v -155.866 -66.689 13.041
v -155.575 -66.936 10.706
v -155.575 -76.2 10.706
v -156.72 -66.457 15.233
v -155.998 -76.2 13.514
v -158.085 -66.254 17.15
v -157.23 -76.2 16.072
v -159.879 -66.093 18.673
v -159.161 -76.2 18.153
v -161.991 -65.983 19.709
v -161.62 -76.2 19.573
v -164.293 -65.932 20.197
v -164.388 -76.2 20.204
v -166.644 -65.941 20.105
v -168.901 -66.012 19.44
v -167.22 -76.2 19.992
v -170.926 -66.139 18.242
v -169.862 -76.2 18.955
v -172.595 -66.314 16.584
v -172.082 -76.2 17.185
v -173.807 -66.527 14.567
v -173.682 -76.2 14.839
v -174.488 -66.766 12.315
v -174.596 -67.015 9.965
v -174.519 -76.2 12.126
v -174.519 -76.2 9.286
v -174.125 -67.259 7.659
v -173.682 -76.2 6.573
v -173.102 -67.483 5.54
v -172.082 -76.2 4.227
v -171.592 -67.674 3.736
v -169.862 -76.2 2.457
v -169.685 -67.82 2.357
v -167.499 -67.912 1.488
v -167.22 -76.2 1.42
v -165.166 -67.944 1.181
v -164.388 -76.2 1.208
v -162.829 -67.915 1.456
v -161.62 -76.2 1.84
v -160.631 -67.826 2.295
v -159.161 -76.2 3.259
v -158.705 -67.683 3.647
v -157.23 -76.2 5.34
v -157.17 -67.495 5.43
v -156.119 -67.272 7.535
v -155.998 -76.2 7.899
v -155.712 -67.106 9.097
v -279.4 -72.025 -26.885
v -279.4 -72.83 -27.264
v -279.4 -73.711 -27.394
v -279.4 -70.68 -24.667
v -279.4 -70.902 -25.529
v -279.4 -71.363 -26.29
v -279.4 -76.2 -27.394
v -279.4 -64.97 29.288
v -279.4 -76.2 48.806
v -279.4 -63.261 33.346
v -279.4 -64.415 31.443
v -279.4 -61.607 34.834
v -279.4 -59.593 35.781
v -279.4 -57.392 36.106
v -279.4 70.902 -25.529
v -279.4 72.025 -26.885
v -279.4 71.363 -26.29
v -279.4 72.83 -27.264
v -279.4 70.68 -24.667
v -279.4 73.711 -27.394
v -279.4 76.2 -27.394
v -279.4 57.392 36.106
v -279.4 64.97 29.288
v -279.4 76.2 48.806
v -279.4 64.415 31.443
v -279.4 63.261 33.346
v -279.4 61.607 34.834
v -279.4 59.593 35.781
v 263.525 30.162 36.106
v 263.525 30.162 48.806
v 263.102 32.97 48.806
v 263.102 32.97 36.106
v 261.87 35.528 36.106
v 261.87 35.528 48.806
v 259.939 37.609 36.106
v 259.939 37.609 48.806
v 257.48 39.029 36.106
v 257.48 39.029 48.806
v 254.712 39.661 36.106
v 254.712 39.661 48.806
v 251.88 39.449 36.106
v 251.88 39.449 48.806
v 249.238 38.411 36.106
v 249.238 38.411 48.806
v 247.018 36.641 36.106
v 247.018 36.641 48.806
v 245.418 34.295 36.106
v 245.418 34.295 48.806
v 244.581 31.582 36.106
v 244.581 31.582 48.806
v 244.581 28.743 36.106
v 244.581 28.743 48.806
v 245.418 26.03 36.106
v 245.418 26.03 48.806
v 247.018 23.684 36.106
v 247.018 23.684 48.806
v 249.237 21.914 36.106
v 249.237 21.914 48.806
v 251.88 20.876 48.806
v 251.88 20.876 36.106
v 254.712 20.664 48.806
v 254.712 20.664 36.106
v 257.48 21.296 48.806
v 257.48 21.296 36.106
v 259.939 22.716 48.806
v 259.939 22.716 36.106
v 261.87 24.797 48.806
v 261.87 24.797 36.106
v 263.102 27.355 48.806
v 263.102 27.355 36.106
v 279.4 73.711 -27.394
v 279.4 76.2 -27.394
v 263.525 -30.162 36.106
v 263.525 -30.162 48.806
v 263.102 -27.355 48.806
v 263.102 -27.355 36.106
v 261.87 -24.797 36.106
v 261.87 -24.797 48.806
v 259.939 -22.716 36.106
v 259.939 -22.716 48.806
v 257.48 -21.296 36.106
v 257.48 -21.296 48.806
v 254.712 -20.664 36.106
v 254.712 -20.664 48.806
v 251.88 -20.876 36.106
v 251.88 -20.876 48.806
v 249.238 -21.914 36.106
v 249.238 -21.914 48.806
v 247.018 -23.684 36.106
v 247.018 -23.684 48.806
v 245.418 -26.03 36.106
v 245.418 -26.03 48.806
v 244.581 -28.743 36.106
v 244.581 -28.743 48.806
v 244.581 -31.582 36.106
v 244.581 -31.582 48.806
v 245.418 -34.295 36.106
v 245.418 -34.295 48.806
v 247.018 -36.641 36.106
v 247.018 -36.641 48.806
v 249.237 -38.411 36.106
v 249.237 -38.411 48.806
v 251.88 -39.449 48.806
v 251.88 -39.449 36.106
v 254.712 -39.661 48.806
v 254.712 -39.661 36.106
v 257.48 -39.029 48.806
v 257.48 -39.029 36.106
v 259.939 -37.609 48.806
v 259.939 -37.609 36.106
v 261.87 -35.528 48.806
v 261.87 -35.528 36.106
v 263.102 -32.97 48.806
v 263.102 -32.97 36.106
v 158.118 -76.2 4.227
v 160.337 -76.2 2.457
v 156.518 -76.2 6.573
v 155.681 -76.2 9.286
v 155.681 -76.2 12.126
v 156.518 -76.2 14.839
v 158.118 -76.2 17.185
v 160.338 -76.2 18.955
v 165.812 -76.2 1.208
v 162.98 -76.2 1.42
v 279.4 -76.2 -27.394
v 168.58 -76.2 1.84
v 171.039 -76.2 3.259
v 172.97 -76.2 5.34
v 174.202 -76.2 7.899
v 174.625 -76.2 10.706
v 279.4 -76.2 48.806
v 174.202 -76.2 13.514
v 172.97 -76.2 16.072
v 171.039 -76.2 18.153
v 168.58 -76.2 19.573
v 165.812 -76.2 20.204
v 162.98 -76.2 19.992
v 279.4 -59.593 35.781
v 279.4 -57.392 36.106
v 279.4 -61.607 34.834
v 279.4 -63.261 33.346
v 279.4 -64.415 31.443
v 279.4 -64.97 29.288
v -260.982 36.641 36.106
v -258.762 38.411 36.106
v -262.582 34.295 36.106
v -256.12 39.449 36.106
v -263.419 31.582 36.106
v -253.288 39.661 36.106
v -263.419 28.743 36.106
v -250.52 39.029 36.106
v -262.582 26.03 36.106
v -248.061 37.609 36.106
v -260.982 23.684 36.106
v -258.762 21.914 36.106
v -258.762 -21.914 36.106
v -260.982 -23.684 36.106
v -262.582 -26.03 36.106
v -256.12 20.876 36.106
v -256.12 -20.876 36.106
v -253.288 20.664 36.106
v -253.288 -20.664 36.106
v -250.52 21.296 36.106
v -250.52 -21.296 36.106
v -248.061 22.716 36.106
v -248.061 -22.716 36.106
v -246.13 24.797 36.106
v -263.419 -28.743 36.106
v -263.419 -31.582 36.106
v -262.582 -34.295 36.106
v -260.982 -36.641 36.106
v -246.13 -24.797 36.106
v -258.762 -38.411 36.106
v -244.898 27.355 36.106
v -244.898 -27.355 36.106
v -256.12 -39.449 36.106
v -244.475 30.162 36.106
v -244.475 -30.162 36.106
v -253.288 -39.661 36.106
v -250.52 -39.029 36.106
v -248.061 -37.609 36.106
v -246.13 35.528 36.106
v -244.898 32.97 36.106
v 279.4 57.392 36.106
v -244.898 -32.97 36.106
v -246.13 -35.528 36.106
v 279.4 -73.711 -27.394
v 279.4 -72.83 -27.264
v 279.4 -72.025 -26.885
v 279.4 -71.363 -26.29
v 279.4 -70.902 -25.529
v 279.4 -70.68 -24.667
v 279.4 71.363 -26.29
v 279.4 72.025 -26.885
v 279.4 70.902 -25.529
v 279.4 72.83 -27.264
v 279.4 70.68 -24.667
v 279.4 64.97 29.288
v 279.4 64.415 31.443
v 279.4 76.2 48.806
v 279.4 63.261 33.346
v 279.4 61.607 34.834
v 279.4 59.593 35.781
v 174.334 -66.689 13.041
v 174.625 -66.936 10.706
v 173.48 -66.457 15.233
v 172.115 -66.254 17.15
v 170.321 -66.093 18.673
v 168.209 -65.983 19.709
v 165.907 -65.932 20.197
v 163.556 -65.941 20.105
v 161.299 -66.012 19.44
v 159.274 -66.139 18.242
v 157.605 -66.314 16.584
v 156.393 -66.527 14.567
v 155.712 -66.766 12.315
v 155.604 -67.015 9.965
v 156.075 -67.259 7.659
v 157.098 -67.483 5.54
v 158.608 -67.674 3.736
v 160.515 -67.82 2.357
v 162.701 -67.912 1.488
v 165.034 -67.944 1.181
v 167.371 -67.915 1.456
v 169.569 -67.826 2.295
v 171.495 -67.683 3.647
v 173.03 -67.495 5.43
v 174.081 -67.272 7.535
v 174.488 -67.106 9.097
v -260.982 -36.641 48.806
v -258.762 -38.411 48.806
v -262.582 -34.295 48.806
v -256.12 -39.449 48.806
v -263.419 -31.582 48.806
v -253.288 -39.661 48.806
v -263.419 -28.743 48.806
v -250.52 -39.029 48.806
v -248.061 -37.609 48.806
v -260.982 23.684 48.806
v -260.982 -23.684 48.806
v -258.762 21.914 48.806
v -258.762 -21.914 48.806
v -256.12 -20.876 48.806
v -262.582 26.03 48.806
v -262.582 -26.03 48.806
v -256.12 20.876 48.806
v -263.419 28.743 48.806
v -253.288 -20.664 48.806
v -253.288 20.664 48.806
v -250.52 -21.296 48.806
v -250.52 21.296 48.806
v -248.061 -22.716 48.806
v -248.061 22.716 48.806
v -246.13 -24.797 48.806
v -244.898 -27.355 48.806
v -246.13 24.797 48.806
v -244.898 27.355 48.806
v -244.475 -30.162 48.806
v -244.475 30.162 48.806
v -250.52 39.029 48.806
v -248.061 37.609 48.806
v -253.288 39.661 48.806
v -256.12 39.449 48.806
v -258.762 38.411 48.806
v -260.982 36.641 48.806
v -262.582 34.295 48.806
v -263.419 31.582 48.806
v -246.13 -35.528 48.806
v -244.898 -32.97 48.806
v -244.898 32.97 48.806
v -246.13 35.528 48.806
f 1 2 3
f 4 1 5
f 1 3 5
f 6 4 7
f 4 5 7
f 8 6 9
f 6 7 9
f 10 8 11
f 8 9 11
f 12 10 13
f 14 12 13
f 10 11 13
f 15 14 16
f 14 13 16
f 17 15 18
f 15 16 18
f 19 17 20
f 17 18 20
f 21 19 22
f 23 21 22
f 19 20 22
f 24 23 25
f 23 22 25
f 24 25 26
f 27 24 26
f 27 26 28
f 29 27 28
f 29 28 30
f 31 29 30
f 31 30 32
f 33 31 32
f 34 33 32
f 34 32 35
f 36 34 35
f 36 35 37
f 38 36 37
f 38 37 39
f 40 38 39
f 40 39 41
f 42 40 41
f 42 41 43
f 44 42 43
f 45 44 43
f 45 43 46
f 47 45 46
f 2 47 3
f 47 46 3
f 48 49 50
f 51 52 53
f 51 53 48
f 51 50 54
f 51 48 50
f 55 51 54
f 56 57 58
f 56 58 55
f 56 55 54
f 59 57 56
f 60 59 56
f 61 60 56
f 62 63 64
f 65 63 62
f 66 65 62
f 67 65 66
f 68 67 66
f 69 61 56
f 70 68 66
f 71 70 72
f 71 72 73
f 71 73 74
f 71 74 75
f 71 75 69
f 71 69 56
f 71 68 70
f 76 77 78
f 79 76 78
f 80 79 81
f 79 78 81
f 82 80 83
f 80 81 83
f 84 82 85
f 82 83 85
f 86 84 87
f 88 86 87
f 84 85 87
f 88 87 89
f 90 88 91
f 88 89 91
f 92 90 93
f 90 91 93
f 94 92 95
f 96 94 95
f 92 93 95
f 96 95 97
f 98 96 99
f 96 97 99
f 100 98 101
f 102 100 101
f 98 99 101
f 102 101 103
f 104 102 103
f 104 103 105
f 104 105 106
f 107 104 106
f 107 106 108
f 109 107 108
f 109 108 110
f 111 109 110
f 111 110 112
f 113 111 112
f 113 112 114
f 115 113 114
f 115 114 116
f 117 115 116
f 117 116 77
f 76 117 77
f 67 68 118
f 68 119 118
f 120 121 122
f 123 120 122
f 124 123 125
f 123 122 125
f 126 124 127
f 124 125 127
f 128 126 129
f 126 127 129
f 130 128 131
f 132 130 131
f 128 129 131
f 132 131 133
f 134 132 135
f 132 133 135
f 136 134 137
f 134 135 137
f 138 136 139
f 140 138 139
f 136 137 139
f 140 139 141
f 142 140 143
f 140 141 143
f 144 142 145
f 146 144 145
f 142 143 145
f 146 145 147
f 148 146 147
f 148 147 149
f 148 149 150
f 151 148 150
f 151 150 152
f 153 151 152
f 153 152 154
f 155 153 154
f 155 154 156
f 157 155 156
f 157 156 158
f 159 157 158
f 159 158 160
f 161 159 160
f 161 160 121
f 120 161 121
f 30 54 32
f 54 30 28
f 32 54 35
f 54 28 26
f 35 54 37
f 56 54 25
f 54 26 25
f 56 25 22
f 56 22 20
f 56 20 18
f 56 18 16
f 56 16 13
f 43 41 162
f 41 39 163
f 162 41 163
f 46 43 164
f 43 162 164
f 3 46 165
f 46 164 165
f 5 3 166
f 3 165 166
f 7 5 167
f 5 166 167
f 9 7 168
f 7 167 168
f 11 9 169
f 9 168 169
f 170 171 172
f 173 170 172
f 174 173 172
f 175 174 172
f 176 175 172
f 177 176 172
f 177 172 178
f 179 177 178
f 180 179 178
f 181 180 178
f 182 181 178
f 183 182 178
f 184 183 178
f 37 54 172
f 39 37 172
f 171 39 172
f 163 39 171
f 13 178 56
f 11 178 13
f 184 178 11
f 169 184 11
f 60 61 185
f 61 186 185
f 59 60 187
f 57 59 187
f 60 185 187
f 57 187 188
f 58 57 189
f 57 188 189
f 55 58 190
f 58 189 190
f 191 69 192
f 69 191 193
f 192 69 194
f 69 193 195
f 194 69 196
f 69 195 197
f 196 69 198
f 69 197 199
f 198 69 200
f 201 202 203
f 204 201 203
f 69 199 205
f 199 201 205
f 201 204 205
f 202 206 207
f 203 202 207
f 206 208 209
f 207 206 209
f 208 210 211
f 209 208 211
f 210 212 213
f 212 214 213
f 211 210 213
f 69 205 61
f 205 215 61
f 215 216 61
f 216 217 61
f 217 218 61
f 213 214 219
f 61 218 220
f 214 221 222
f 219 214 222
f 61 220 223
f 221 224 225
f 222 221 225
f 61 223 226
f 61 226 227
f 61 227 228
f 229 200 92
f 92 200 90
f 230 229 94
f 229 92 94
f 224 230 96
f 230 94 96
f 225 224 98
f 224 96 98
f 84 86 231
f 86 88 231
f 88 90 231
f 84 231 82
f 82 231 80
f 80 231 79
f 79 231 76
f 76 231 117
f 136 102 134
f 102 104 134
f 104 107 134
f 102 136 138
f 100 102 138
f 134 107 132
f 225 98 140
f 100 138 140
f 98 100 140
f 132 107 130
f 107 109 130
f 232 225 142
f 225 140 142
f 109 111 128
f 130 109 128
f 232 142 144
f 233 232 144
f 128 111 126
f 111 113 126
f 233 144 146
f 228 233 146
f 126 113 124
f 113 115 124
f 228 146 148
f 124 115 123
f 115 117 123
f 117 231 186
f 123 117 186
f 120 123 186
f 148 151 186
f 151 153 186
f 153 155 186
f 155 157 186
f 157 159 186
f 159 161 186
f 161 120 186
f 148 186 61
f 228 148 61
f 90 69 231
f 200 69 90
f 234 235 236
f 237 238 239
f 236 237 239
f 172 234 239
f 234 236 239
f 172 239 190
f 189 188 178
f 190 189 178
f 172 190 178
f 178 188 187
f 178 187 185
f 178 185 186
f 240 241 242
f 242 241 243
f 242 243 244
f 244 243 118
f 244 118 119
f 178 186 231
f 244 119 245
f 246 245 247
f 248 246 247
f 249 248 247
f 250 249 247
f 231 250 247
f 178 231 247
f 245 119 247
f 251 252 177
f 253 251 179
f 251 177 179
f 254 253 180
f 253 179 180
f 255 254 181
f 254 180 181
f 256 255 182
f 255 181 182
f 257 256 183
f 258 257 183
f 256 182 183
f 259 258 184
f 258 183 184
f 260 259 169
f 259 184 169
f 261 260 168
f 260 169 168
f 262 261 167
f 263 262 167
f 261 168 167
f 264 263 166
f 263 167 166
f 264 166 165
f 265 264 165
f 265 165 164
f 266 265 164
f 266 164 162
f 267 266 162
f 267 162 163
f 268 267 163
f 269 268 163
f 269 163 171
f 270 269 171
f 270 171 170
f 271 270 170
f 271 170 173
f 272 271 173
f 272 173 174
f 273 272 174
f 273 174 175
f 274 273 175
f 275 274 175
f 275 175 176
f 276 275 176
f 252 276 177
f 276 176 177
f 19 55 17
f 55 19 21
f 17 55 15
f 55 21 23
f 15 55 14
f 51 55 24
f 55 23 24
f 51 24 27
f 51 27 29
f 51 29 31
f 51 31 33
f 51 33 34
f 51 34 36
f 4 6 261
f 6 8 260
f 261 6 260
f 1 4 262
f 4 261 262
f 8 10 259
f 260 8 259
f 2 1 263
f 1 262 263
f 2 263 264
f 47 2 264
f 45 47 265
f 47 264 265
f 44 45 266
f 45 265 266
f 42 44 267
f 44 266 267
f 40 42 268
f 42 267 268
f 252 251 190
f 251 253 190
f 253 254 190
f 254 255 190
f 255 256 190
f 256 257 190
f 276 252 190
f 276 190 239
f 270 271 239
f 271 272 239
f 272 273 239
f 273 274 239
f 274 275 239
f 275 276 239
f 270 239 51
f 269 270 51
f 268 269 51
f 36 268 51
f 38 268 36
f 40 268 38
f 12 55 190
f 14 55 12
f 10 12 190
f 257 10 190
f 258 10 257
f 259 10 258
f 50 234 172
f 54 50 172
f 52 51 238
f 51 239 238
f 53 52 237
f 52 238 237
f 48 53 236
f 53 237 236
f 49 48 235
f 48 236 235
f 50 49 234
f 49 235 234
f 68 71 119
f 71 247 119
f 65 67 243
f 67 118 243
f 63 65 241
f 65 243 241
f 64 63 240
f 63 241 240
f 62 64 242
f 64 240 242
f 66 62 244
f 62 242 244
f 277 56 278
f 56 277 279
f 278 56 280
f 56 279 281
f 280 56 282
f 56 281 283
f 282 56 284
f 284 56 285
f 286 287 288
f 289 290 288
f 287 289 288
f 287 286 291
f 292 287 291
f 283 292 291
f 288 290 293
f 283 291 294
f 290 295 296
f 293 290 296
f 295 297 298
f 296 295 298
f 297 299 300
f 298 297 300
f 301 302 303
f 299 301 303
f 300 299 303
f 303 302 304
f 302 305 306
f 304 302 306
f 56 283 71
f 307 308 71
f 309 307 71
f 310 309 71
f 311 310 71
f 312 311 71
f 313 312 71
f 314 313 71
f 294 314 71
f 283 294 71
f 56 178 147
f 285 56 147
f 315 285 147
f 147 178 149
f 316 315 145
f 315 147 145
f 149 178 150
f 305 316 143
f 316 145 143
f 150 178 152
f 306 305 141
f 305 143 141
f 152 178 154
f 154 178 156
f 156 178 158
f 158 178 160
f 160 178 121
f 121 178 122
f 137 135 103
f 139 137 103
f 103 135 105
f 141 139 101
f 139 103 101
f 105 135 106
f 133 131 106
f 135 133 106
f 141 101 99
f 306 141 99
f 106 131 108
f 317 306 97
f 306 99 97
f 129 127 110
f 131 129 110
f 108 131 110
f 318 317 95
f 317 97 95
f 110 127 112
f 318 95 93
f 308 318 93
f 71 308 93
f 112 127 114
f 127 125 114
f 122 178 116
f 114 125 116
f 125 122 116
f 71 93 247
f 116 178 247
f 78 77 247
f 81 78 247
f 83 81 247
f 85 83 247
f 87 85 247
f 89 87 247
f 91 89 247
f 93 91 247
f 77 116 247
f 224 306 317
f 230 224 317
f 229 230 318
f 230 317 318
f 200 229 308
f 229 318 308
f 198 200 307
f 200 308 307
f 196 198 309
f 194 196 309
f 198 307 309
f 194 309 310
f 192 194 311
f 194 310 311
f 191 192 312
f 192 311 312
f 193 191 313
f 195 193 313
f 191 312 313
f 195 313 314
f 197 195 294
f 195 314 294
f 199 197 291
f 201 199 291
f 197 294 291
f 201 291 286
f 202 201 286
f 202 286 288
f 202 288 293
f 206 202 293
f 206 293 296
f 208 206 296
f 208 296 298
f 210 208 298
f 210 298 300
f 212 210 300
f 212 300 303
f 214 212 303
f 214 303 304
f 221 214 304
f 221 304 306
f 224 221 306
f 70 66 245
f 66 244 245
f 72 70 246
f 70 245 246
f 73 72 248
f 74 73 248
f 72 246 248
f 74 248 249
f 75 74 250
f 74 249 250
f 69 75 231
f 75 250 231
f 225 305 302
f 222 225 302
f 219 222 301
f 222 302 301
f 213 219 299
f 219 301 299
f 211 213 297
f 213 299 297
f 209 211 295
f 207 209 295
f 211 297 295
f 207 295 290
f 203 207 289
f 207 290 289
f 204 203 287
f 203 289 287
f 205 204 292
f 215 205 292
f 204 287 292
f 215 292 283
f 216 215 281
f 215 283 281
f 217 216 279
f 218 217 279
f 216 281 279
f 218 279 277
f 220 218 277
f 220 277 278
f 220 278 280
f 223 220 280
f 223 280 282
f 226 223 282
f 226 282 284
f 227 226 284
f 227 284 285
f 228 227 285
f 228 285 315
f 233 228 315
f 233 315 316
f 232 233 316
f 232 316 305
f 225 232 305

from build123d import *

# Parameters (mm, degrees)
BOSS_EXTRUDE1_DEPTH = 279.4
CUT_EXTRUDE1_REACH  = 78.2
SKETCH2_R           = 9.525
CUT_EXTRUDE2_REACH  = 154.4
SKETCH3_R           = 9.525


with BuildPart() as part:
    # Sketch1 → Boss-Extrude1 (new body, symmetric)
    with BuildSketch(Plane(origin=(0, 0, 0), x_dir=(0, 0, -1), z_dir=(1, 0, 0))):
        with BuildLine():
            Line((-48.8061, -76.2), (-48.8061, 76.2))
            Line((-48.8061, 76.2), (27.3939, 76.2))
            Line((27.3939, 76.2), (27.3939, 73.710744653))
            ThreePointArc((27.3939, 73.710744653), (26.61173954, 71.672050174), (24.666685315, 70.679672107))
            Line((24.666685315, 70.679672107), (-29.288063286, 64.969518115))
            ThreePointArc((-29.288063286, 64.969518115), (-34.150698849, 62.488572947), (-36.1061, 57.391836749))
            Line((-36.1061, 57.391836749), (-36.1061, -57.391836749))
            ThreePointArc((-36.1061, -57.391836749), (-34.150698849, -62.488572947), (-29.288063286, -64.969518115))
            Line((-29.288063286, -64.969518115), (24.666685315, -70.679672107))
            ThreePointArc((24.666685315, -70.679672107), (26.61173954, -71.672050174), (27.3939, -73.710744653))
            Line((27.3939, -73.710744653), (27.3939, -76.2))
            Line((27.3939, -76.2), (-48.8061, -76.2))
        make_face()
    extrude(amount=BOSS_EXTRUDE1_DEPTH, both=True)

    # Sketch2 → Cut-Extrude1 (cut, up to next)
    with BuildSketch(Plane.XY.offset(48.8061), mode=Mode.PRIVATE) as cut_extrude1_sk1:
        with Locations((-254, 30.1625)):
            Circle(SKETCH2_R)
    cut_extrude1_tool1 = extrude(cut_extrude1_sk1.sketch, amount=-CUT_EXTRUDE1_REACH, mode=Mode.PRIVATE) & part.part
    add(cut_extrude1_tool1.solids().sort_by_distance((-254, 30.1625, 48.8061))[0], mode=Mode.SUBTRACT)
    # Sketch2 → Cut-Extrude1 (cut, up to next)
    with BuildSketch(Plane.XY.offset(48.8061), mode=Mode.PRIVATE) as cut_extrude1_sk2:
        with Locations((-254, -30.1625)):
            Circle(SKETCH2_R)
    cut_extrude1_tool2 = extrude(cut_extrude1_sk2.sketch, amount=-CUT_EXTRUDE1_REACH, mode=Mode.PRIVATE) & part.part
    add(cut_extrude1_tool2.solids().sort_by_distance((-254, -30.1625, 48.8061))[0], mode=Mode.SUBTRACT)
    # Sketch2 → Cut-Extrude1 (cut, up to next)
    with BuildSketch(Plane.XY.offset(48.8061), mode=Mode.PRIVATE) as cut_extrude1_sk3:
        with Locations((254, -30.1625)):
            Circle(SKETCH2_R)
    cut_extrude1_tool3 = extrude(cut_extrude1_sk3.sketch, amount=-CUT_EXTRUDE1_REACH, mode=Mode.PRIVATE) & part.part
    add(cut_extrude1_tool3.solids().sort_by_distance((254, -30.1625, 48.8061))[0], mode=Mode.SUBTRACT)
    # Sketch2 → Cut-Extrude1 (cut, up to next)
    with BuildSketch(Plane.XY.offset(48.8061), mode=Mode.PRIVATE) as cut_extrude1_sk4:
        with Locations((254, 30.1625)):
            Circle(SKETCH2_R)
    cut_extrude1_tool4 = extrude(cut_extrude1_sk4.sketch, amount=-CUT_EXTRUDE1_REACH, mode=Mode.PRIVATE) & part.part
    add(cut_extrude1_tool4.solids().sort_by_distance((254, 30.1625, 48.8061))[0], mode=Mode.SUBTRACT)

    # Sketch3 → Cut-Extrude2 (cut, up to next)
    with BuildSketch(Plane.XZ.offset(76.2), mode=Mode.PRIVATE) as cut_extrude2_sk1:
        with Locations((-165.1, 10.7061)):
            Circle(SKETCH3_R)
    cut_extrude2_tool1 = extrude(cut_extrude2_sk1.sketch, amount=-CUT_EXTRUDE2_REACH, mode=Mode.PRIVATE) & part.part
    add(cut_extrude2_tool1.solids().sort_by_distance((-165.1, -76.2, 10.7061))[0], mode=Mode.SUBTRACT)
    # Sketch3 → Cut-Extrude2 (cut, up to next)
    with BuildSketch(Plane.XZ.offset(76.2), mode=Mode.PRIVATE) as cut_extrude2_sk2:
        with Locations((165.1, 10.7061)):
            Circle(SKETCH3_R)
    cut_extrude2_tool2 = extrude(cut_extrude2_sk2.sketch, amount=-CUT_EXTRUDE2_REACH, mode=Mode.PRIVATE) & part.part
    add(cut_extrude2_tool2.solids().sort_by_distance((165.1, -76.2, 10.7061))[0], mode=Mode.SUBTRACT)


solid = part.part
